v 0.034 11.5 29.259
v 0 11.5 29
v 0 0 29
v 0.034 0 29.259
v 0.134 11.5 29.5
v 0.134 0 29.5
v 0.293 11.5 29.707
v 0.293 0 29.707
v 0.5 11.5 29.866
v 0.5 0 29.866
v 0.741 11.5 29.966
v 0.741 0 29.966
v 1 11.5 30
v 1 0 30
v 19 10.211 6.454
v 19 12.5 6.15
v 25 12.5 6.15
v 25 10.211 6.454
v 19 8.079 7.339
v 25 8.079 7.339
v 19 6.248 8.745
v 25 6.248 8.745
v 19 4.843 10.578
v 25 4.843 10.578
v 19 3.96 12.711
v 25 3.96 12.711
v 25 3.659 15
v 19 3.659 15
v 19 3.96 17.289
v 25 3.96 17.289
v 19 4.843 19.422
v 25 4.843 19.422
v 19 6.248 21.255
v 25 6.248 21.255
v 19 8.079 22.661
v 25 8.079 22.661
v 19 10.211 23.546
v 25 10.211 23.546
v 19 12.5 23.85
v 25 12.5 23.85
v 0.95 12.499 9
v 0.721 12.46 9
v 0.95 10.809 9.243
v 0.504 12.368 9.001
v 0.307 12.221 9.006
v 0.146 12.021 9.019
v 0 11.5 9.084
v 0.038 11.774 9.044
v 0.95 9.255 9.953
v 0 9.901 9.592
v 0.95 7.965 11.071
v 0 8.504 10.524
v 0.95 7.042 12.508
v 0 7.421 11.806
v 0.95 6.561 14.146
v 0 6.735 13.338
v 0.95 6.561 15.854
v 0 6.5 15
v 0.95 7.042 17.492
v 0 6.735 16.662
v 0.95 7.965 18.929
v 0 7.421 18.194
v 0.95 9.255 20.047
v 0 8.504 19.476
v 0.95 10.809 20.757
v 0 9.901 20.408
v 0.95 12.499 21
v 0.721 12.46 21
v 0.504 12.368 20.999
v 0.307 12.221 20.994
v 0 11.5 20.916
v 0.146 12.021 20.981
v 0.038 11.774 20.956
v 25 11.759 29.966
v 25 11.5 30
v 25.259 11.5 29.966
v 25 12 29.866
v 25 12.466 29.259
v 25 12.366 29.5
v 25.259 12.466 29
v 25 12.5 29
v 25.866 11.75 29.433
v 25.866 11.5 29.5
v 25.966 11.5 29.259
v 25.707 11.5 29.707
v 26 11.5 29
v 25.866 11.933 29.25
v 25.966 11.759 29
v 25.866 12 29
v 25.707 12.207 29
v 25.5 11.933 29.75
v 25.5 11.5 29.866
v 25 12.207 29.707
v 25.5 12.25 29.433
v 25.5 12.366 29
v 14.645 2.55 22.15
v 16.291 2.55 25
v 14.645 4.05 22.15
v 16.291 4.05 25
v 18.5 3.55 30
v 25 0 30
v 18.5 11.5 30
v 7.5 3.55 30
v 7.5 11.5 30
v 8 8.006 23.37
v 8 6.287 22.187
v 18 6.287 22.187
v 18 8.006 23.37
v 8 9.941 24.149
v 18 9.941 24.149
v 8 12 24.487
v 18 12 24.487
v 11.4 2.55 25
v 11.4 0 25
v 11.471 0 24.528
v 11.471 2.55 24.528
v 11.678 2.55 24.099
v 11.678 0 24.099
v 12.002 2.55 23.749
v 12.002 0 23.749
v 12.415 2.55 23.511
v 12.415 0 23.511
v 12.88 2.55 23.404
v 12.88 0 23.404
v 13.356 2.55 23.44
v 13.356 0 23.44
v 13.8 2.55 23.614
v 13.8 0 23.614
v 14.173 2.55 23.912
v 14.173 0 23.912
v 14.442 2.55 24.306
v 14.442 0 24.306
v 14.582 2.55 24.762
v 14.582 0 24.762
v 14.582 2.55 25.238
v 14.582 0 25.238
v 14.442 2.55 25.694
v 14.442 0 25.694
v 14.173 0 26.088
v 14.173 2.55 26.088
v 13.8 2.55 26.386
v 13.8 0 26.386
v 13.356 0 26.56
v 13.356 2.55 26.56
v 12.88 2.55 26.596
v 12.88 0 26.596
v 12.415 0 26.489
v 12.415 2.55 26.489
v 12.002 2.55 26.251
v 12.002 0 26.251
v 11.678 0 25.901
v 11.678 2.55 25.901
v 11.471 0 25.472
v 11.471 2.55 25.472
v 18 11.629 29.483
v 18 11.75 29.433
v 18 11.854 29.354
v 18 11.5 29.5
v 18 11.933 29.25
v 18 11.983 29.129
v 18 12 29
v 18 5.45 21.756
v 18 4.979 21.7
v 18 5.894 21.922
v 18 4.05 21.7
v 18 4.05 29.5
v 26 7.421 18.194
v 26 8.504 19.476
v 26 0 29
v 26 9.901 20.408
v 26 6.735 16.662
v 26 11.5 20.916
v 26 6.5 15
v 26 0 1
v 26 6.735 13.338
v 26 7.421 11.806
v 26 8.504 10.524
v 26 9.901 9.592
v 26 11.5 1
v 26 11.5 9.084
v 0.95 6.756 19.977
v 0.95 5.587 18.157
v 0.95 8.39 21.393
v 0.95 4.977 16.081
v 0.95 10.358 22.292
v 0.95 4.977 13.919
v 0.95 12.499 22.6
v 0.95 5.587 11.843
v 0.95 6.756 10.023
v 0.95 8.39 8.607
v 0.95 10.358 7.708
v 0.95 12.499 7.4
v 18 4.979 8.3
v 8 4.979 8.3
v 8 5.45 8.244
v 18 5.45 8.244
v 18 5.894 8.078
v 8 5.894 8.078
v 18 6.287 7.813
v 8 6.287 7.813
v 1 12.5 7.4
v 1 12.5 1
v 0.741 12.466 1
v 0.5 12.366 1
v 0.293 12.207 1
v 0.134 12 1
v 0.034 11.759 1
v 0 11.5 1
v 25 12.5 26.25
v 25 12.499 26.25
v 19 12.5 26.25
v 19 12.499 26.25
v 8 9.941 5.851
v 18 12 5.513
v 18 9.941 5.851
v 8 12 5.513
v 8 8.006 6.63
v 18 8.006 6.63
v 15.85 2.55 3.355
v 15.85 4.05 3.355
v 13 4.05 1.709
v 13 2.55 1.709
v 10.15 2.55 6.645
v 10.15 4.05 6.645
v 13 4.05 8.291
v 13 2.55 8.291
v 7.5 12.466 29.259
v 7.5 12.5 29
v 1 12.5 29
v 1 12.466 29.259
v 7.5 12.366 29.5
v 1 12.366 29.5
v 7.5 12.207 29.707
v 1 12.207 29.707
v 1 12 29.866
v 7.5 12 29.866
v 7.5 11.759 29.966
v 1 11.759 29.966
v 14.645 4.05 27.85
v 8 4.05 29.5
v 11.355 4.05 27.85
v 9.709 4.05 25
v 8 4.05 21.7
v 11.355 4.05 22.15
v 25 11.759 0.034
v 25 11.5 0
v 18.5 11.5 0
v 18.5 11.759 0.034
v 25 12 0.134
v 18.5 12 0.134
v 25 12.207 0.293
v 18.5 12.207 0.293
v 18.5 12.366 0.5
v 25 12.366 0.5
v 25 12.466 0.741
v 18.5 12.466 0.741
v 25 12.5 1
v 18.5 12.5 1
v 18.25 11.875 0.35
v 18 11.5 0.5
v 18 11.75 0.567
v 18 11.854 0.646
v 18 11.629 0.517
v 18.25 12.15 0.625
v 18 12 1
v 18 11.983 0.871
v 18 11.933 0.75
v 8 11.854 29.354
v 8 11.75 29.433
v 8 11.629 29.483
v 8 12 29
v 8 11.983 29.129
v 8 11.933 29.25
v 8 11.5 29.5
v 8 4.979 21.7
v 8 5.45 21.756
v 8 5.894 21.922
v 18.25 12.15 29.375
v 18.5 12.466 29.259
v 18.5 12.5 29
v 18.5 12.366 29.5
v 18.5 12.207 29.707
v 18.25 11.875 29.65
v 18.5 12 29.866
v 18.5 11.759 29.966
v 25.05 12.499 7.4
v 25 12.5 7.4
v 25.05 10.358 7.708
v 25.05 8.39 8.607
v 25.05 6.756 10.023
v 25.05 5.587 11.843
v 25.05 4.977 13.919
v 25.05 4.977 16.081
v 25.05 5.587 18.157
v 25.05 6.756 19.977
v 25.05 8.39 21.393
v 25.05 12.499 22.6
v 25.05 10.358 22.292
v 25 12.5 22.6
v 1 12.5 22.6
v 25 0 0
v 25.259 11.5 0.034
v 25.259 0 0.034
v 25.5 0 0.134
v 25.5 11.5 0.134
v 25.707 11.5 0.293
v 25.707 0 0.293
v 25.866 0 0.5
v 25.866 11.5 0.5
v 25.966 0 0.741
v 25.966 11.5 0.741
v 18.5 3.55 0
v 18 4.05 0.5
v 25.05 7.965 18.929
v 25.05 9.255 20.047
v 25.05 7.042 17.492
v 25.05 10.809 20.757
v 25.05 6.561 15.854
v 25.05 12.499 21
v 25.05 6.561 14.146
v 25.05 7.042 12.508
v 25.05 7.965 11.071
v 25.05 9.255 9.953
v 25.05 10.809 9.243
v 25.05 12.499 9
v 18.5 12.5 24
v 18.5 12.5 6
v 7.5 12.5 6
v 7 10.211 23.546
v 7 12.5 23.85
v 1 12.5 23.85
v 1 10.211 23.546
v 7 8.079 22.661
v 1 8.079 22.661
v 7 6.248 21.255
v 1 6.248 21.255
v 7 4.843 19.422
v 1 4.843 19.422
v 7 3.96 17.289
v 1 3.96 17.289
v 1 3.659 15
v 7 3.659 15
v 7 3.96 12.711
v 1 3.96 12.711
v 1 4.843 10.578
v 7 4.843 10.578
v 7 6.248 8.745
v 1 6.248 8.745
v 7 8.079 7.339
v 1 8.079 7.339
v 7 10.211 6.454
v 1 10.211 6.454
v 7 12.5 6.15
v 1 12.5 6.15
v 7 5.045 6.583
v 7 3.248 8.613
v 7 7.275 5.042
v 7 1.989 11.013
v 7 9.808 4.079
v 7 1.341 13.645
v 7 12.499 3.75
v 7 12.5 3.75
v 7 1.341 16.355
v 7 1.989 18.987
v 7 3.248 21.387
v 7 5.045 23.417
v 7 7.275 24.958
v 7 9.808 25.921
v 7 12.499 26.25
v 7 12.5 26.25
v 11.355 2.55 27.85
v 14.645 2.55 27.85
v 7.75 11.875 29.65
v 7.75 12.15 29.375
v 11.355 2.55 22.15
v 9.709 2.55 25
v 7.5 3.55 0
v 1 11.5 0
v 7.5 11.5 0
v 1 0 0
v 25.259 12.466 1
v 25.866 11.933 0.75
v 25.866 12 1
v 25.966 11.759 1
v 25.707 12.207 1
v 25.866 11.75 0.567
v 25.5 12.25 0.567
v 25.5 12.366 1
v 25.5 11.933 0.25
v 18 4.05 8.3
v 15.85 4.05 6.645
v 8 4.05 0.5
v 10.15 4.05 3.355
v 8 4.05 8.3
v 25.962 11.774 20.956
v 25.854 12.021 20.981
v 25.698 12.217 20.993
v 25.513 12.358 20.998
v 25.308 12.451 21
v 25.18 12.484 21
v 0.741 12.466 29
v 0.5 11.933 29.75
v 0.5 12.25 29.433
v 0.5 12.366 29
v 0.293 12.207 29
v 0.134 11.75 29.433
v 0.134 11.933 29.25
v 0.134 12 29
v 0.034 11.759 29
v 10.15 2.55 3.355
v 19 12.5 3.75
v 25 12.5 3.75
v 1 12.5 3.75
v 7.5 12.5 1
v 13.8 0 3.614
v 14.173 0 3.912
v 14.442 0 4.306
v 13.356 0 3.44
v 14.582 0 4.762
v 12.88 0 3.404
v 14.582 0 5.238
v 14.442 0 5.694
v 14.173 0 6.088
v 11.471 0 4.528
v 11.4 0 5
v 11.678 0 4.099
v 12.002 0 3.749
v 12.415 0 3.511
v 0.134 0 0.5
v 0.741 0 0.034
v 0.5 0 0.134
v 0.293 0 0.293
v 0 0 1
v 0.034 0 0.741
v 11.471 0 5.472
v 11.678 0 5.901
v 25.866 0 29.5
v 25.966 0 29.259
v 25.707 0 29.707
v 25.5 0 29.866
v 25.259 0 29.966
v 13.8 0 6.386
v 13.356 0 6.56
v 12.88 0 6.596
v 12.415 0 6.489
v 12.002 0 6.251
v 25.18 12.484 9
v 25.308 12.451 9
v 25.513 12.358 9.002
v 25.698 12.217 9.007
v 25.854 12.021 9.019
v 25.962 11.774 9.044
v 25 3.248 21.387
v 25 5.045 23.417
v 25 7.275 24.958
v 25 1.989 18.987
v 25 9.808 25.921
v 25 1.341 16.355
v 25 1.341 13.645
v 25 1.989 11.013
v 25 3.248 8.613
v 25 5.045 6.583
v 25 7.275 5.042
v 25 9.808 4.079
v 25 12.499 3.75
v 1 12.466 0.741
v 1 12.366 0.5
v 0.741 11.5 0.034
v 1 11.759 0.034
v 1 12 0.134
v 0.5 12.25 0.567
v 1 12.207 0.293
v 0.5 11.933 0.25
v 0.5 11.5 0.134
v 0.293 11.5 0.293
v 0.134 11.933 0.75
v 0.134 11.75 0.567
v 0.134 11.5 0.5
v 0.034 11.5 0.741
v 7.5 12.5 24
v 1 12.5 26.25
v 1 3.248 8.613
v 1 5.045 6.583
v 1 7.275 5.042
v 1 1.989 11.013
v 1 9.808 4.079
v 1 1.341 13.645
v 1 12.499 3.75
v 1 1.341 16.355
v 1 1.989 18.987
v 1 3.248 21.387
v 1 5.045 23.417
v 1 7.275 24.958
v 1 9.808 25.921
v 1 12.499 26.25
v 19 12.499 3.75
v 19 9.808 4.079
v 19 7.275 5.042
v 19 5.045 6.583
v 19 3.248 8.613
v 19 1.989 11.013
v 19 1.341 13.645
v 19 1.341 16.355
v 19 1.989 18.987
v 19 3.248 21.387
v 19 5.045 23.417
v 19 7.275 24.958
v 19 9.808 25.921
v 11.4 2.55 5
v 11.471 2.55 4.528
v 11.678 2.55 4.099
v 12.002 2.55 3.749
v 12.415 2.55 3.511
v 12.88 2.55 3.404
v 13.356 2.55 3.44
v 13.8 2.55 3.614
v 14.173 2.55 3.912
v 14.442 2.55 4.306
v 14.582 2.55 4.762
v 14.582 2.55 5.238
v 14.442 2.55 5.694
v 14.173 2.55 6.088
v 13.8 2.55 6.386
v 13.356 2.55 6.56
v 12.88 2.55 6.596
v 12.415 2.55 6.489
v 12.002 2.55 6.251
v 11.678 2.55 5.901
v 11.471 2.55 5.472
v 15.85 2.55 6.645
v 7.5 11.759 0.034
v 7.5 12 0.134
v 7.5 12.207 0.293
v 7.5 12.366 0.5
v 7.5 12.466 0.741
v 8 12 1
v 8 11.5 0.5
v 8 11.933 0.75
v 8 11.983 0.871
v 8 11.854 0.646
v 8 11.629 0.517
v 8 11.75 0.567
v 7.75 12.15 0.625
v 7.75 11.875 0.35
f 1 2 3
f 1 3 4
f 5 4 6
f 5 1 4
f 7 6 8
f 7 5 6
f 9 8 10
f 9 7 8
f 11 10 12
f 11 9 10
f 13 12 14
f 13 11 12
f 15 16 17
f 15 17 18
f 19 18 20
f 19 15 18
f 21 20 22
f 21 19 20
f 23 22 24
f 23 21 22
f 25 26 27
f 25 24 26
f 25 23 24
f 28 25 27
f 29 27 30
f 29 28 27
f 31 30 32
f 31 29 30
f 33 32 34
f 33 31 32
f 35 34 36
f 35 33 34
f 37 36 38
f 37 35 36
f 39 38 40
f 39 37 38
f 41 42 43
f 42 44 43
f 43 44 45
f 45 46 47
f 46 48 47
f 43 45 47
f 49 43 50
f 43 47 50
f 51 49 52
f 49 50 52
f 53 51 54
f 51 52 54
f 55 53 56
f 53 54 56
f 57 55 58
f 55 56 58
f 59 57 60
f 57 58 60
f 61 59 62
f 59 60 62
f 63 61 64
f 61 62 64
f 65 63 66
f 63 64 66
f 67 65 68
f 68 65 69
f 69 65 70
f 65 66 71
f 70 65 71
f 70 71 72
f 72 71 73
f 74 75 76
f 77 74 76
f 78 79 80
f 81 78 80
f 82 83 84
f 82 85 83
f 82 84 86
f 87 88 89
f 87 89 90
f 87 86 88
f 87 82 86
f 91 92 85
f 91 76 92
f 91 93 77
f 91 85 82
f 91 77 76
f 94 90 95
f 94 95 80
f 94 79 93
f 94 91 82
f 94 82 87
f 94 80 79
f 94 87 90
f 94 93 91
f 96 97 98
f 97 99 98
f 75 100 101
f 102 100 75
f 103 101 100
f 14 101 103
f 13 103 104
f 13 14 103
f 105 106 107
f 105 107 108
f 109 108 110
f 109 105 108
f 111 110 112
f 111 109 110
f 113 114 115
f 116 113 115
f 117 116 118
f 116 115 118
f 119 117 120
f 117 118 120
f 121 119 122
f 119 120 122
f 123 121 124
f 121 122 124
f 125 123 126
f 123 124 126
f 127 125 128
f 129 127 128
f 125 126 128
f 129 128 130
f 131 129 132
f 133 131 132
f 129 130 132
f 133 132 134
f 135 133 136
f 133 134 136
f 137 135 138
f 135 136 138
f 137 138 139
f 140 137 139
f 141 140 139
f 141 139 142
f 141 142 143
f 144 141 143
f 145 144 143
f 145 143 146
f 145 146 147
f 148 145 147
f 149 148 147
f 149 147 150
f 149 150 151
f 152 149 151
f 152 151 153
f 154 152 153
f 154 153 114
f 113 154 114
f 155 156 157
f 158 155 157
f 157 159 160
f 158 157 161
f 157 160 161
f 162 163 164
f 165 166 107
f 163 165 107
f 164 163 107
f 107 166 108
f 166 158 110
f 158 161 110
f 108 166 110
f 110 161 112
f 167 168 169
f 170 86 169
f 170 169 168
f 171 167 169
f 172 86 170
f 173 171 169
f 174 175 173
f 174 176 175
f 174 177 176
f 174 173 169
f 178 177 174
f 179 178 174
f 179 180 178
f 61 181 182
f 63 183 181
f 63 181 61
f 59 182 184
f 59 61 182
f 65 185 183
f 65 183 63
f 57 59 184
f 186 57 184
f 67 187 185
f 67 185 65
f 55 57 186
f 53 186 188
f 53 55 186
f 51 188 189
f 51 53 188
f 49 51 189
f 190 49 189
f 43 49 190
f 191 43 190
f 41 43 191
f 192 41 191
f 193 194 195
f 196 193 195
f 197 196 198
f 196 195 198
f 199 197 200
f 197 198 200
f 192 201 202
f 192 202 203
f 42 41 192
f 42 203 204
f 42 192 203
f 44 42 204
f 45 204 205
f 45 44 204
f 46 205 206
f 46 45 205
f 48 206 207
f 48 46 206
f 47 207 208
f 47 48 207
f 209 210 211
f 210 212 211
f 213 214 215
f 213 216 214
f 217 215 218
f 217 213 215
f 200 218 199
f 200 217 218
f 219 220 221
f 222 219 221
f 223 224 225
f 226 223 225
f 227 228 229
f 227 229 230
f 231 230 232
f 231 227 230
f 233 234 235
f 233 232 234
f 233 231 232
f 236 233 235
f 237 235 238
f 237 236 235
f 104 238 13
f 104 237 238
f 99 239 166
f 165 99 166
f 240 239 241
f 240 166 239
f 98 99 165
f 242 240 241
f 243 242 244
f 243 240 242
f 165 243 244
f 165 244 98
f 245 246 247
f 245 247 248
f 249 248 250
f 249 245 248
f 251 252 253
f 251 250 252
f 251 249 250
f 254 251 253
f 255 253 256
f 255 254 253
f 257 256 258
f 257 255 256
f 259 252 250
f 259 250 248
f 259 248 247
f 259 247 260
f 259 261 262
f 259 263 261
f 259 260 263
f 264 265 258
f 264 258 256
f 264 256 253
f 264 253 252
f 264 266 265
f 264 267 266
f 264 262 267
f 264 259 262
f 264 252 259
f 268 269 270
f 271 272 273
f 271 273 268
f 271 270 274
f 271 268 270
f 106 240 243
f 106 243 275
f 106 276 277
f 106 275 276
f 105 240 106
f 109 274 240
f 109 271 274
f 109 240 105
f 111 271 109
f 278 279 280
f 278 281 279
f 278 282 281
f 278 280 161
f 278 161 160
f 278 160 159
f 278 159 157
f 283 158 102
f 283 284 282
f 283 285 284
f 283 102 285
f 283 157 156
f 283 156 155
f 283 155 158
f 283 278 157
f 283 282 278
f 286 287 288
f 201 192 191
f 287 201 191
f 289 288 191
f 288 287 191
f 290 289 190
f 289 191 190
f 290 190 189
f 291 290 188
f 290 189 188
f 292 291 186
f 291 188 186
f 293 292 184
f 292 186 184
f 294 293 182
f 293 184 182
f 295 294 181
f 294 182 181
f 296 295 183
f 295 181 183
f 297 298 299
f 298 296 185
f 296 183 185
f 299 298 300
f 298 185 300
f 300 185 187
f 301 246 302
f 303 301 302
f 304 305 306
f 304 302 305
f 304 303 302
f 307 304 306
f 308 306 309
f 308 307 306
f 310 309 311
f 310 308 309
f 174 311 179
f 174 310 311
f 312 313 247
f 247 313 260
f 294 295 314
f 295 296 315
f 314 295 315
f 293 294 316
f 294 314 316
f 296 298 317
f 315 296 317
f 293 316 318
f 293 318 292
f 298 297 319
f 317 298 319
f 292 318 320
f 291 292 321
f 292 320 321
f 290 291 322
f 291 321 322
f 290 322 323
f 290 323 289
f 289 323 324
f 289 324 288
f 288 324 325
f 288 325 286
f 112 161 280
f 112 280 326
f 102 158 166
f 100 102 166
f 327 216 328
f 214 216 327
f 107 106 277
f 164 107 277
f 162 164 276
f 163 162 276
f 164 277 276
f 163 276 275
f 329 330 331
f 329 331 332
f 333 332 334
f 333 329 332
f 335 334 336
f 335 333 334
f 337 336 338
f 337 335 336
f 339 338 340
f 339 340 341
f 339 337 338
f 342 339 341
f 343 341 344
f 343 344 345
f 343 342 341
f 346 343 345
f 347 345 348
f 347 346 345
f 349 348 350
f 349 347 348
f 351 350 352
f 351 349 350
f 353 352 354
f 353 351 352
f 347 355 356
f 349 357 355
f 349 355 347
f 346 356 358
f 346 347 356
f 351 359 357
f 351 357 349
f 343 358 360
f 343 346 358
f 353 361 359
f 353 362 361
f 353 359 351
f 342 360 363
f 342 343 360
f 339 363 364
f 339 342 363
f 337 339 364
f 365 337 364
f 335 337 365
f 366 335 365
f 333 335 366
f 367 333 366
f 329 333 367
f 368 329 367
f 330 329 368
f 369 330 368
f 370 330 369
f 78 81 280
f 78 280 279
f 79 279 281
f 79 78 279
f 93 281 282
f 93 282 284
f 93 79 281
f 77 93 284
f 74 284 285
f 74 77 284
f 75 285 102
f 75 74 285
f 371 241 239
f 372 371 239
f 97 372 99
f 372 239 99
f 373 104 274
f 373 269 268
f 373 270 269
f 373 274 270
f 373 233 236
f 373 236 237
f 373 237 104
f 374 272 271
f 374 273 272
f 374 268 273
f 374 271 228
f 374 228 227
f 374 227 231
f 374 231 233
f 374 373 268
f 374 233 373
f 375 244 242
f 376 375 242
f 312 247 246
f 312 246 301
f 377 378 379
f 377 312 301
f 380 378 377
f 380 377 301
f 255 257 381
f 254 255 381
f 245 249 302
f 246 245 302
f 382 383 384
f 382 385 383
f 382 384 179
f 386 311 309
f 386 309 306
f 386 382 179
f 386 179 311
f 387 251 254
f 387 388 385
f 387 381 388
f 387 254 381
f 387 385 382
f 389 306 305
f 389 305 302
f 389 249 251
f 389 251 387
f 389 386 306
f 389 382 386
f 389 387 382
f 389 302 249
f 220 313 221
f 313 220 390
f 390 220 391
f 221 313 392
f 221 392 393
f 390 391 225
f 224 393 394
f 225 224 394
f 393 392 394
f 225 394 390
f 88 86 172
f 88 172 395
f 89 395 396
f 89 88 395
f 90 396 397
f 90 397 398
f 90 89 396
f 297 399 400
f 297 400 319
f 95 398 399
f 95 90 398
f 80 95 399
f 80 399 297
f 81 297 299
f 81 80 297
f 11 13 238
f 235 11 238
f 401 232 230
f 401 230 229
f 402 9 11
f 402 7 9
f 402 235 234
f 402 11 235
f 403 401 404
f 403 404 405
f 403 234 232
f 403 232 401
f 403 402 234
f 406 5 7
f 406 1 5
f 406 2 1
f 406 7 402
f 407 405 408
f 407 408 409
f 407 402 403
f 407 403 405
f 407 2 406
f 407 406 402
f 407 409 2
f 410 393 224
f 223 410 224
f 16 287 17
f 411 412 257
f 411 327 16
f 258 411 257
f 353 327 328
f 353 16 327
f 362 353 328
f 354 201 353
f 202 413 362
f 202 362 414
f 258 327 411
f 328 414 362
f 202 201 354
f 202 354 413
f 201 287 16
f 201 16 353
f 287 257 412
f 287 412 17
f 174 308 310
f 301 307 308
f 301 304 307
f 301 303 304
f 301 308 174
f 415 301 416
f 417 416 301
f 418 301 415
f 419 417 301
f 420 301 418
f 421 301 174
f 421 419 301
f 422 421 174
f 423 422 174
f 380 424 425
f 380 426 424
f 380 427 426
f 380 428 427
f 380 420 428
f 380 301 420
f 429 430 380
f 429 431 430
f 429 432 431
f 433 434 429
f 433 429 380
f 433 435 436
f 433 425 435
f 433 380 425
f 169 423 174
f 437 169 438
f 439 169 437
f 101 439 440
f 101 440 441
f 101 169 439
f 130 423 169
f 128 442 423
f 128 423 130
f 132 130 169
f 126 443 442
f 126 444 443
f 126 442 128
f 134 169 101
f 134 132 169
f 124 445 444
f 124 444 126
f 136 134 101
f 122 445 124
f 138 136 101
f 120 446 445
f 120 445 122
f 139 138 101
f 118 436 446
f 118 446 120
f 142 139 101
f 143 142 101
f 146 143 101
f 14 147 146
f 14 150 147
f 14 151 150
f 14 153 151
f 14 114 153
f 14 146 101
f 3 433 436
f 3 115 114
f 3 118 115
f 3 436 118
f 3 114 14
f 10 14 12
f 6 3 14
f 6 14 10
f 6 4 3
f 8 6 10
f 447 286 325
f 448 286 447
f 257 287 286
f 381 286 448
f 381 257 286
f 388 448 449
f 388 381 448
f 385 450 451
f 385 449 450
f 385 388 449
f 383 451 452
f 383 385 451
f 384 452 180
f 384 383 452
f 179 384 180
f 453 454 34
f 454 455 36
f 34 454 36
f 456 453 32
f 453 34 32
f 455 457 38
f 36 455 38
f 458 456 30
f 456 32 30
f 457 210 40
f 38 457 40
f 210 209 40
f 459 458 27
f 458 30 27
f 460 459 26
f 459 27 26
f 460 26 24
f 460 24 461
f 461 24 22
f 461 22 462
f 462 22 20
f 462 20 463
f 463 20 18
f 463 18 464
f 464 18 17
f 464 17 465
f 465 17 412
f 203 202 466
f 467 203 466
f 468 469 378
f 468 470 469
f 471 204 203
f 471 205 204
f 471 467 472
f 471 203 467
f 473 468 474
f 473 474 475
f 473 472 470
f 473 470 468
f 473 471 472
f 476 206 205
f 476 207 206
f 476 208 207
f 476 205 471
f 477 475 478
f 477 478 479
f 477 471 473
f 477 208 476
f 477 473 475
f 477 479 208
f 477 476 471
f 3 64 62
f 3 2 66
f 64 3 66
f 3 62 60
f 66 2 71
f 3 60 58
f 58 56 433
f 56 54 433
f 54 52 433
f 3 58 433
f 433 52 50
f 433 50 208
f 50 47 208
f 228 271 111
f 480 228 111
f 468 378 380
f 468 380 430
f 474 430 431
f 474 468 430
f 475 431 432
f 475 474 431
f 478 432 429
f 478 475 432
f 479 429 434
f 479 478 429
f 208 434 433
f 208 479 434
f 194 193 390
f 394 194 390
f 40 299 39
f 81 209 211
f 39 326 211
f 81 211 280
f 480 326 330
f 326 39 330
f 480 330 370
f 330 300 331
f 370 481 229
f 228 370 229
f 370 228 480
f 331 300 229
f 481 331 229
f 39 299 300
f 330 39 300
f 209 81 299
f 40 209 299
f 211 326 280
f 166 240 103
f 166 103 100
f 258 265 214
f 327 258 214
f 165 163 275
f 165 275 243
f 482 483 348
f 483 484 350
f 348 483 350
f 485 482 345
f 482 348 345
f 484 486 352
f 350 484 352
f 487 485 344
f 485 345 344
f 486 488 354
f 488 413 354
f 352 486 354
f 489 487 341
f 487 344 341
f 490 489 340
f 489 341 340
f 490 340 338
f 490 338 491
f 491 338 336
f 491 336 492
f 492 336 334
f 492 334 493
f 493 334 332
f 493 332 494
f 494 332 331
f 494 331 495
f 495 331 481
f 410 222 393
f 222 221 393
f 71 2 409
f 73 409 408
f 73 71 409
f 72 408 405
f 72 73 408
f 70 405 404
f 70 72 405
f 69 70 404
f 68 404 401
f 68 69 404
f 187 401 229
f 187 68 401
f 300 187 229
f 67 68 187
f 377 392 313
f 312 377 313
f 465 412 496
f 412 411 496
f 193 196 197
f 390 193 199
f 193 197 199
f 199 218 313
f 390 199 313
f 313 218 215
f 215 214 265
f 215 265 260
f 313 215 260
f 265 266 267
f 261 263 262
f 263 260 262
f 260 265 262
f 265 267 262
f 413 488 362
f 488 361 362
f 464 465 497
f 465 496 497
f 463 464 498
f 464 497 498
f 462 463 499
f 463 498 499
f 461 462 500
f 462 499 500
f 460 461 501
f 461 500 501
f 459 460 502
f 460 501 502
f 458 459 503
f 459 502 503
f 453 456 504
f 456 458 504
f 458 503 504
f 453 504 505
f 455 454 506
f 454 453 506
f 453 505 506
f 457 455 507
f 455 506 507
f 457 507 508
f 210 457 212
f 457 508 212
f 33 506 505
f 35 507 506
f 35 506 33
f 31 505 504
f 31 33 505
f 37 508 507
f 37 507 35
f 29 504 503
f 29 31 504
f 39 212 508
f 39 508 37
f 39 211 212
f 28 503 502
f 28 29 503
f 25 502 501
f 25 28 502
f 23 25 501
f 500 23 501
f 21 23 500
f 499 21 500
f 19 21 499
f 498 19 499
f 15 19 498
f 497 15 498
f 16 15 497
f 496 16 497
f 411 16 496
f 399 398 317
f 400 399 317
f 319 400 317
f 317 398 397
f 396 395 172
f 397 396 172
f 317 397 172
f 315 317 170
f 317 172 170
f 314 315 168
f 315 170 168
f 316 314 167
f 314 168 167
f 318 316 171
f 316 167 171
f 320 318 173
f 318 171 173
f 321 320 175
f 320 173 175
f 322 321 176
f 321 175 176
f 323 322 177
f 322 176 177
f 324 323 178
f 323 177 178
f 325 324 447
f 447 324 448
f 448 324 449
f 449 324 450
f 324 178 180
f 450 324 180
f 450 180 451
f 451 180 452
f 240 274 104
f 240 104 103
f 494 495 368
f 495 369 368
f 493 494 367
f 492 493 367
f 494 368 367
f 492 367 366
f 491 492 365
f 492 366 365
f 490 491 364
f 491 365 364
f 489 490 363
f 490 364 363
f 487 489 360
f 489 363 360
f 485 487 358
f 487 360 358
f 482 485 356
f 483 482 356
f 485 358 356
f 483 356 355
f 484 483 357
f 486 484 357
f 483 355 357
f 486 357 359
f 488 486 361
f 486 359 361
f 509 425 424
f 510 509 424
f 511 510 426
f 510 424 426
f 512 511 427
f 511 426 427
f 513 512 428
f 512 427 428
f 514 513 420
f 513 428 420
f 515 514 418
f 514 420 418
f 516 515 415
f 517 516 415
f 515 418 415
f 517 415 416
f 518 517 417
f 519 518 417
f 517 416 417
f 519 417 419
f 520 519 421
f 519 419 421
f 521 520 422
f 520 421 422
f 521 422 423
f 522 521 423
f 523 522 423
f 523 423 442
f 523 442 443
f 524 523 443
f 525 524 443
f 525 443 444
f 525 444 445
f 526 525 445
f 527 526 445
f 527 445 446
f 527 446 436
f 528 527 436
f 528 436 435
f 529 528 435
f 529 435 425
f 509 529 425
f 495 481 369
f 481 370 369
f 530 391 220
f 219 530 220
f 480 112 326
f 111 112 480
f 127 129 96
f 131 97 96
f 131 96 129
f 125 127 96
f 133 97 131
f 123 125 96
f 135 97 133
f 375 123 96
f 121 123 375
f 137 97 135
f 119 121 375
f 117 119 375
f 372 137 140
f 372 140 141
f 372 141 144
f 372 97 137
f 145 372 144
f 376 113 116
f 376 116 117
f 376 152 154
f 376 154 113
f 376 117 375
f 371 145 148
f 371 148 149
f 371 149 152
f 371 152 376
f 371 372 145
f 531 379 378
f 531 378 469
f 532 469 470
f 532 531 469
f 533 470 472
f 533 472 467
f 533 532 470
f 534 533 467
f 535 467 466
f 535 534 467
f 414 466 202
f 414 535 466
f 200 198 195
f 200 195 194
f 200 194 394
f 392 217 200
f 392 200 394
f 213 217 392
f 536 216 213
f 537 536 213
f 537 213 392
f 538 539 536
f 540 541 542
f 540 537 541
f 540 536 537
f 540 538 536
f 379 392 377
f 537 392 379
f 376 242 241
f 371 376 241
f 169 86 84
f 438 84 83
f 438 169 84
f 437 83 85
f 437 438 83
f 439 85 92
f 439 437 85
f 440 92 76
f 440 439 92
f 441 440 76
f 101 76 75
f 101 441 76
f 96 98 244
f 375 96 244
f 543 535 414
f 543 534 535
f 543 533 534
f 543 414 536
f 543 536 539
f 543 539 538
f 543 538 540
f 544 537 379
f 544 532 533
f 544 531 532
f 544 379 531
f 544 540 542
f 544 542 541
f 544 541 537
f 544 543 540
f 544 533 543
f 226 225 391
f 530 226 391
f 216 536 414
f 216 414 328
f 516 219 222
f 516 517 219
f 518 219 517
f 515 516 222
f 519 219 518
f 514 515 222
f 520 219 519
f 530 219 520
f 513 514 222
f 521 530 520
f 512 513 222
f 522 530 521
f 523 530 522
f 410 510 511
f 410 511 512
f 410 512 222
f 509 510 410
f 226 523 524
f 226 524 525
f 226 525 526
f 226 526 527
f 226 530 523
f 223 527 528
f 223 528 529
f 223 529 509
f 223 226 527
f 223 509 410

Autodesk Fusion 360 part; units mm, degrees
sketch "Sketch1" plane through (0, 0, 0) normal (1, 0, 0) x (0, 0, -1)
  line L0 (0, 12.5) -> (0, 0)
  line L1 (0, 0) -> (-30, 0)
  line L2 (-30, 0) -> (-30, 12.5)
  arc A0 (-22.6, 12.5) -> (-7.4, 12.5) centre (-15, 12.5) ccw
  line L3 (-30, 12.5) -> (-22.6, 12.5)
  line L4 (-7.4, 12.5) -> (0, 12.5)
  dimension "d1" = 15.2
  dimension "d2" = 30
  dimension "d3" = 12.5
extrude "Extrude1" add sketch "Sketch1" along normal blind 26
sketch "Sketch2" plane through (26, 0, 0) normal (1, 0, 0) x (0, 0, -1)
  arc A0 (-22.6, 12.5) -> (-7.4, 12.5) centre (-15, 12.5) ccw
  line L0 (-22.6, 12.5) -> (-30, 12.5)
  line L1 (-30, 12.5) -> (-30, 0)
  line L2 (-30, 0) -> (0, 0)
  line L3 (0, 0) -> (0, 12.5)
  line L4 (0, 12.5) -> (-7.4, 12.5)
  line L5 (-22.6, 12.5) -> (-21, 12.5)
  line L6 (-9, 12.5) -> (-7.4, 12.5)
  arc A1 (-21, 12.5) -> (-9, 12.5) centre (-15, 12.5) ccw
  dimension "d6" = 12
extrude "Extrude2" add sketch "Sketch2" against normal blind 0.95 contours A0 L5 L6 A1
sketch "Sketch3" plane through (0, 6.25, 15) normal (1, 0, 0) x (0, 0, -1)
  line L0 (7.6, 6.25) -> (15, 6.25)
  line L1 (6, 6.25) -> (7.6, 6.25)
  line L2 (-15, 6.25) -> (-7.6, 6.25)
  line L3 (-6, 6.25) -> (-7.6, 6.25)
  arc A0 (-6, 6.25) -> (6, 6.25) centre (0, 6.25) ccw
  arc A1 (-7.6, 6.25) -> (7.6, 6.25) centre (0, 6.25) ccw
  arc A2 (-7.6, 6.25) -> (7.6, 6.25) centre (0, 6.25) ccw
  point P0 (0, 6.25)
  dimension "d9" = 12
extrude "Extrude3" add sketch "Sketch3" along normal blind 0.95
ref_plane "WorkPlane1" through (22, 6.25, 15) normal (1, 0, 0) x (0, 0, -1)
fillet "Fillet1" radius 1 1 edges at (13, 12.5, 0)
fillet "Fillet2" radius 1 1 edges at (13, 12.5, 30)
sketch "Sketch6" plane through (0, 12.5, 0) normal (0, 1, 0) x (-1, 0, 0)
  line L0 (-26, 1) -> (0, 1)
  line L1 (0, 1) -> (0, 9)
  line L2 (0, 9) -> (-0.95, 9)
  line L3 (-0.95, 9) -> (-0.95, 7.4)
  line L4 (-0.95, 7.4) -> (-25.05, 7.4)
  line L5 (-25.05, 7.4) -> (-25.05, 9)
  line L6 (-25.05, 9) -> (-26, 9)
  line L7 (-26, 9) -> (-26, 1)
  circle A0 centre (-13, 5) radius 1.6
  circle A1 centre (-13, 25) radius 1.6
  line L8 (-13, 5) -> (-13, 25) construction
  line L9 (13, 15) -> (-39, 15) construction
  dimension "d15" = 3.2
  dimension "d16" = 3.2
  dimension "d17" = 20
extrude "Extrude4" cut sketch "Sketch6" along normal blind -9 and the other way blind 30 contours A0 | A1
sketch "Sketch7" plane through (22, 6.25, 15) normal (1, 0, 0) x (0, 0, -1)
  arc A0 (-7.6, 6.25) -> (7.6, 6.25) centre (0, 6.25) ccw
  arc A1 (-7.6, 6.25) -> (7.6, 6.25) centre (0, 6.25) ccw
  line L0 (-15, 6.25) -> (-15, -6.25)
  line L1 (-15, -6.25) -> (15, -6.25)
  line L2 (15, -6.25) -> (15, 6.25)
  arc A2 (-10.05, 6.25) -> (10.05, 6.25) centre (0, 6.25) ccw
  line L3 (0, -1.35) -> (0, -3.8) construction
  line L4 (0, -3.8) -> (0, -6.25) construction
  arc A3 (-8.85, 6.2511) -> (8.85, 6.2511) centre (0, 6.2592) ccw
  arc A4 (-8.85, 6.2511) -> (-11.25, 6.2489) centre (-10.05, 6.25) ccw
  arc A5 (-11.25, 6.2489) -> (11.25, 6.2489) centre (0, 6.2592) ccw
  arc A6 (11.25, 6.2489) -> (8.85, 6.2511) centre (10.05, 6.25) ccw
  arc A7 (-10.05, 6.25) -> (10.05, 6.25) centre (0, 6.2592) ccw construction
  dimension "d22" = 1.2
extrude "Extrude5" cut sketch "Sketch7" along normal mid plane 6
ref_plane "WorkPlane2" through (13, 12.5, 15) normal (1, 0, 0) x (0, 0, 1)
mirror "Mirror1" about plane through (13, 12.5, 15) normal (1, 0, 0) of "Extrude5"
ref_plane "WorkPlane3" through (13, 6.25, 15) normal (1, 0, 0) x (0, 0, -1)
sketch "Sketch9" plane through (13, 6.25, 15) normal (1, 0, 0) x (0, 0, -1)
  arc A0 (-6, 6.25) -> (6, 6.25) centre (0, 6.25) ccw
  arc A1 (-6, 6.25) -> (6, 6.25) centre (0, 6.25) ccw
  line L0 (-15, -2) -> (-15, -2.2)
  line L1 (-15, -2.2) -> (-6.7, -2.2)
  line L2 (0, -3.25) -> (0, -2)
  line L3 (-15, 5.25) -> (-15, -6.25)
  line L4 (15, -2) -> (15, -2.2)
  line L5 (15, -2.2) -> (6.7, -2.2)
  line L6 (0, -3.25) -> (0, -2)
  line L7 (-9.5, 6.25) -> (-15, 6.25)
  line L8 (-15, 6.25) -> (-15, -2)
  line L9 (9.5, 6.25) -> (15, 6.25)
  line L10 (15, 6.25) -> (15, -2)
  line L11 (6.7, -0.485) -> (6.7, -2.2)
  line L12 (-6.7, -0.485) -> (-6.7, -2.2)
  arc A2 (-9.5, 6.25) -> (-6.7, -0.485) centre (0, 6.25) ccw
  arc A3 (6.7, -0.485) -> (9.5, 6.25) centre (0, 6.25) ccw
  dimension "d34" = 19
  dimension "d44" = 8.3
  dimension "d45" = 8.3
  dimension "d50" = 0.2
  dimension "d51" = 0.2
extrude "Extrude8" cut sketch "Sketch9" along normal mid plane 10
sketch "Sketch11" plane through (0, 4.05, 0) normal (0, 1, 0) x (-1, 0, 0)
  line L0 (-8, 8.3) -> (-18, 8.3)
  line L1 (-18, 8.3) -> (-18, 0)
  line L2 (-8, 0) -> (-8, 8.3)
  line L3 (-9.7091, 25) -> (-11.3546, 27.85)
  line L4 (-11.3546, 27.85) -> (-14.6454, 27.85)
  line L5 (-14.6454, 27.85) -> (-16.2909, 25)
  line L6 (-16.2909, 25) -> (-14.6454, 22.15)
  line L7 (-14.6454, 22.15) -> (-11.3546, 22.15)
  line L8 (-11.3546, 22.15) -> (-9.7091, 25)
  circle A0 centre (-13, 25) radius 1.6 construction
  point P0 (-13, 25)
  dimension "d38" = 2.85
extrude "Extrude9" cut sketch "Sketch11" against normal blind 1.5
sketch "Sketch12" plane through (0, 4.05, 0) normal (0, 1, 0) x (-1, 0, 0)
  line L0 (-8, 8.3) -> (-18, 8.3)
  line L1 (-18, 8.3) -> (-18, 0)
  line L2 (-18, 0) -> (-8, 0)
  line L3 (-8, 0) -> (-8, 8.3)
  line L4 (-15.85, 3.3546) -> (-13, 1.7091)
  line L5 (-13, 1.7091) -> (-10.15, 3.3546)
  line L6 (-10.15, 3.3546) -> (-10.15, 6.6454)
  line L7 (-10.15, 6.6454) -> (-13, 8.2909)
  line L8 (-13, 8.2909) -> (-15.85, 6.6454)
  line L9 (-15.85, 6.6454) -> (-15.85, 3.3546)
  point P0 (-13, 5)
  dimension "d41" = 2.85
extrude "Extrude10" cut sketch "Sketch12" against normal blind 1.5 contours L4 L5 L6 L7 L8 L9
chamfer "Chamfer1" distance 0.5 angle 45 8 edges at (18, 7.775, 0) (18, 12.2071, 0.2929) (18, 12.5, 3.25) (13, 12.5, 5.5) (8, 12.5, 3.25) (8, 12.2071, 0.2929) (8, 7.775, 0) (13, 4.05, 0)
chamfer "Chamfer2" distance 0.5 angle 45 8 edges at (8, 7.775, 30) (8, 12.2071, 29.7071) (8, 12.5, 26.75) (13, 12.5, 24.5) (18, 12.5, 26.75) (18, 12.2071, 29.7071) (18, 7.775, 30) (13, 4.05, 30)
fillet "Fillet3" radius 2 1 edges at (13, 5.765, 21.7)
fillet "Fillet4" radius 2 1 edges at (13, 5.765, 8.3)
fillet "Fillet5" radius 1 3 edges at (26, 12.5, 25) (26, 12.2071, 29.7071) (26, 5.75, 30)
fillet "Fillet6" radius 1 9 edges at (26, 5.75, 0) (26, 12.2071, 0.2929) (26, 12.5, 5) (0, 12.5, 5) (0, 12.2071, 0.2929) (0, 5.75, 0) (0, 5.75, 30) (0, 12.2071, 29.7071) (0, 12.5, 25)
ref_plane "WorkPlane4" through (13, 5.75, 15) normal (0, 0, 1) x (0, -1, 0)
equation "d7 = -wall_width"
equation "d10 = wall_width"
equation "wall_width = 0.95 mm"
equation "nut_depth = 3 mm"
